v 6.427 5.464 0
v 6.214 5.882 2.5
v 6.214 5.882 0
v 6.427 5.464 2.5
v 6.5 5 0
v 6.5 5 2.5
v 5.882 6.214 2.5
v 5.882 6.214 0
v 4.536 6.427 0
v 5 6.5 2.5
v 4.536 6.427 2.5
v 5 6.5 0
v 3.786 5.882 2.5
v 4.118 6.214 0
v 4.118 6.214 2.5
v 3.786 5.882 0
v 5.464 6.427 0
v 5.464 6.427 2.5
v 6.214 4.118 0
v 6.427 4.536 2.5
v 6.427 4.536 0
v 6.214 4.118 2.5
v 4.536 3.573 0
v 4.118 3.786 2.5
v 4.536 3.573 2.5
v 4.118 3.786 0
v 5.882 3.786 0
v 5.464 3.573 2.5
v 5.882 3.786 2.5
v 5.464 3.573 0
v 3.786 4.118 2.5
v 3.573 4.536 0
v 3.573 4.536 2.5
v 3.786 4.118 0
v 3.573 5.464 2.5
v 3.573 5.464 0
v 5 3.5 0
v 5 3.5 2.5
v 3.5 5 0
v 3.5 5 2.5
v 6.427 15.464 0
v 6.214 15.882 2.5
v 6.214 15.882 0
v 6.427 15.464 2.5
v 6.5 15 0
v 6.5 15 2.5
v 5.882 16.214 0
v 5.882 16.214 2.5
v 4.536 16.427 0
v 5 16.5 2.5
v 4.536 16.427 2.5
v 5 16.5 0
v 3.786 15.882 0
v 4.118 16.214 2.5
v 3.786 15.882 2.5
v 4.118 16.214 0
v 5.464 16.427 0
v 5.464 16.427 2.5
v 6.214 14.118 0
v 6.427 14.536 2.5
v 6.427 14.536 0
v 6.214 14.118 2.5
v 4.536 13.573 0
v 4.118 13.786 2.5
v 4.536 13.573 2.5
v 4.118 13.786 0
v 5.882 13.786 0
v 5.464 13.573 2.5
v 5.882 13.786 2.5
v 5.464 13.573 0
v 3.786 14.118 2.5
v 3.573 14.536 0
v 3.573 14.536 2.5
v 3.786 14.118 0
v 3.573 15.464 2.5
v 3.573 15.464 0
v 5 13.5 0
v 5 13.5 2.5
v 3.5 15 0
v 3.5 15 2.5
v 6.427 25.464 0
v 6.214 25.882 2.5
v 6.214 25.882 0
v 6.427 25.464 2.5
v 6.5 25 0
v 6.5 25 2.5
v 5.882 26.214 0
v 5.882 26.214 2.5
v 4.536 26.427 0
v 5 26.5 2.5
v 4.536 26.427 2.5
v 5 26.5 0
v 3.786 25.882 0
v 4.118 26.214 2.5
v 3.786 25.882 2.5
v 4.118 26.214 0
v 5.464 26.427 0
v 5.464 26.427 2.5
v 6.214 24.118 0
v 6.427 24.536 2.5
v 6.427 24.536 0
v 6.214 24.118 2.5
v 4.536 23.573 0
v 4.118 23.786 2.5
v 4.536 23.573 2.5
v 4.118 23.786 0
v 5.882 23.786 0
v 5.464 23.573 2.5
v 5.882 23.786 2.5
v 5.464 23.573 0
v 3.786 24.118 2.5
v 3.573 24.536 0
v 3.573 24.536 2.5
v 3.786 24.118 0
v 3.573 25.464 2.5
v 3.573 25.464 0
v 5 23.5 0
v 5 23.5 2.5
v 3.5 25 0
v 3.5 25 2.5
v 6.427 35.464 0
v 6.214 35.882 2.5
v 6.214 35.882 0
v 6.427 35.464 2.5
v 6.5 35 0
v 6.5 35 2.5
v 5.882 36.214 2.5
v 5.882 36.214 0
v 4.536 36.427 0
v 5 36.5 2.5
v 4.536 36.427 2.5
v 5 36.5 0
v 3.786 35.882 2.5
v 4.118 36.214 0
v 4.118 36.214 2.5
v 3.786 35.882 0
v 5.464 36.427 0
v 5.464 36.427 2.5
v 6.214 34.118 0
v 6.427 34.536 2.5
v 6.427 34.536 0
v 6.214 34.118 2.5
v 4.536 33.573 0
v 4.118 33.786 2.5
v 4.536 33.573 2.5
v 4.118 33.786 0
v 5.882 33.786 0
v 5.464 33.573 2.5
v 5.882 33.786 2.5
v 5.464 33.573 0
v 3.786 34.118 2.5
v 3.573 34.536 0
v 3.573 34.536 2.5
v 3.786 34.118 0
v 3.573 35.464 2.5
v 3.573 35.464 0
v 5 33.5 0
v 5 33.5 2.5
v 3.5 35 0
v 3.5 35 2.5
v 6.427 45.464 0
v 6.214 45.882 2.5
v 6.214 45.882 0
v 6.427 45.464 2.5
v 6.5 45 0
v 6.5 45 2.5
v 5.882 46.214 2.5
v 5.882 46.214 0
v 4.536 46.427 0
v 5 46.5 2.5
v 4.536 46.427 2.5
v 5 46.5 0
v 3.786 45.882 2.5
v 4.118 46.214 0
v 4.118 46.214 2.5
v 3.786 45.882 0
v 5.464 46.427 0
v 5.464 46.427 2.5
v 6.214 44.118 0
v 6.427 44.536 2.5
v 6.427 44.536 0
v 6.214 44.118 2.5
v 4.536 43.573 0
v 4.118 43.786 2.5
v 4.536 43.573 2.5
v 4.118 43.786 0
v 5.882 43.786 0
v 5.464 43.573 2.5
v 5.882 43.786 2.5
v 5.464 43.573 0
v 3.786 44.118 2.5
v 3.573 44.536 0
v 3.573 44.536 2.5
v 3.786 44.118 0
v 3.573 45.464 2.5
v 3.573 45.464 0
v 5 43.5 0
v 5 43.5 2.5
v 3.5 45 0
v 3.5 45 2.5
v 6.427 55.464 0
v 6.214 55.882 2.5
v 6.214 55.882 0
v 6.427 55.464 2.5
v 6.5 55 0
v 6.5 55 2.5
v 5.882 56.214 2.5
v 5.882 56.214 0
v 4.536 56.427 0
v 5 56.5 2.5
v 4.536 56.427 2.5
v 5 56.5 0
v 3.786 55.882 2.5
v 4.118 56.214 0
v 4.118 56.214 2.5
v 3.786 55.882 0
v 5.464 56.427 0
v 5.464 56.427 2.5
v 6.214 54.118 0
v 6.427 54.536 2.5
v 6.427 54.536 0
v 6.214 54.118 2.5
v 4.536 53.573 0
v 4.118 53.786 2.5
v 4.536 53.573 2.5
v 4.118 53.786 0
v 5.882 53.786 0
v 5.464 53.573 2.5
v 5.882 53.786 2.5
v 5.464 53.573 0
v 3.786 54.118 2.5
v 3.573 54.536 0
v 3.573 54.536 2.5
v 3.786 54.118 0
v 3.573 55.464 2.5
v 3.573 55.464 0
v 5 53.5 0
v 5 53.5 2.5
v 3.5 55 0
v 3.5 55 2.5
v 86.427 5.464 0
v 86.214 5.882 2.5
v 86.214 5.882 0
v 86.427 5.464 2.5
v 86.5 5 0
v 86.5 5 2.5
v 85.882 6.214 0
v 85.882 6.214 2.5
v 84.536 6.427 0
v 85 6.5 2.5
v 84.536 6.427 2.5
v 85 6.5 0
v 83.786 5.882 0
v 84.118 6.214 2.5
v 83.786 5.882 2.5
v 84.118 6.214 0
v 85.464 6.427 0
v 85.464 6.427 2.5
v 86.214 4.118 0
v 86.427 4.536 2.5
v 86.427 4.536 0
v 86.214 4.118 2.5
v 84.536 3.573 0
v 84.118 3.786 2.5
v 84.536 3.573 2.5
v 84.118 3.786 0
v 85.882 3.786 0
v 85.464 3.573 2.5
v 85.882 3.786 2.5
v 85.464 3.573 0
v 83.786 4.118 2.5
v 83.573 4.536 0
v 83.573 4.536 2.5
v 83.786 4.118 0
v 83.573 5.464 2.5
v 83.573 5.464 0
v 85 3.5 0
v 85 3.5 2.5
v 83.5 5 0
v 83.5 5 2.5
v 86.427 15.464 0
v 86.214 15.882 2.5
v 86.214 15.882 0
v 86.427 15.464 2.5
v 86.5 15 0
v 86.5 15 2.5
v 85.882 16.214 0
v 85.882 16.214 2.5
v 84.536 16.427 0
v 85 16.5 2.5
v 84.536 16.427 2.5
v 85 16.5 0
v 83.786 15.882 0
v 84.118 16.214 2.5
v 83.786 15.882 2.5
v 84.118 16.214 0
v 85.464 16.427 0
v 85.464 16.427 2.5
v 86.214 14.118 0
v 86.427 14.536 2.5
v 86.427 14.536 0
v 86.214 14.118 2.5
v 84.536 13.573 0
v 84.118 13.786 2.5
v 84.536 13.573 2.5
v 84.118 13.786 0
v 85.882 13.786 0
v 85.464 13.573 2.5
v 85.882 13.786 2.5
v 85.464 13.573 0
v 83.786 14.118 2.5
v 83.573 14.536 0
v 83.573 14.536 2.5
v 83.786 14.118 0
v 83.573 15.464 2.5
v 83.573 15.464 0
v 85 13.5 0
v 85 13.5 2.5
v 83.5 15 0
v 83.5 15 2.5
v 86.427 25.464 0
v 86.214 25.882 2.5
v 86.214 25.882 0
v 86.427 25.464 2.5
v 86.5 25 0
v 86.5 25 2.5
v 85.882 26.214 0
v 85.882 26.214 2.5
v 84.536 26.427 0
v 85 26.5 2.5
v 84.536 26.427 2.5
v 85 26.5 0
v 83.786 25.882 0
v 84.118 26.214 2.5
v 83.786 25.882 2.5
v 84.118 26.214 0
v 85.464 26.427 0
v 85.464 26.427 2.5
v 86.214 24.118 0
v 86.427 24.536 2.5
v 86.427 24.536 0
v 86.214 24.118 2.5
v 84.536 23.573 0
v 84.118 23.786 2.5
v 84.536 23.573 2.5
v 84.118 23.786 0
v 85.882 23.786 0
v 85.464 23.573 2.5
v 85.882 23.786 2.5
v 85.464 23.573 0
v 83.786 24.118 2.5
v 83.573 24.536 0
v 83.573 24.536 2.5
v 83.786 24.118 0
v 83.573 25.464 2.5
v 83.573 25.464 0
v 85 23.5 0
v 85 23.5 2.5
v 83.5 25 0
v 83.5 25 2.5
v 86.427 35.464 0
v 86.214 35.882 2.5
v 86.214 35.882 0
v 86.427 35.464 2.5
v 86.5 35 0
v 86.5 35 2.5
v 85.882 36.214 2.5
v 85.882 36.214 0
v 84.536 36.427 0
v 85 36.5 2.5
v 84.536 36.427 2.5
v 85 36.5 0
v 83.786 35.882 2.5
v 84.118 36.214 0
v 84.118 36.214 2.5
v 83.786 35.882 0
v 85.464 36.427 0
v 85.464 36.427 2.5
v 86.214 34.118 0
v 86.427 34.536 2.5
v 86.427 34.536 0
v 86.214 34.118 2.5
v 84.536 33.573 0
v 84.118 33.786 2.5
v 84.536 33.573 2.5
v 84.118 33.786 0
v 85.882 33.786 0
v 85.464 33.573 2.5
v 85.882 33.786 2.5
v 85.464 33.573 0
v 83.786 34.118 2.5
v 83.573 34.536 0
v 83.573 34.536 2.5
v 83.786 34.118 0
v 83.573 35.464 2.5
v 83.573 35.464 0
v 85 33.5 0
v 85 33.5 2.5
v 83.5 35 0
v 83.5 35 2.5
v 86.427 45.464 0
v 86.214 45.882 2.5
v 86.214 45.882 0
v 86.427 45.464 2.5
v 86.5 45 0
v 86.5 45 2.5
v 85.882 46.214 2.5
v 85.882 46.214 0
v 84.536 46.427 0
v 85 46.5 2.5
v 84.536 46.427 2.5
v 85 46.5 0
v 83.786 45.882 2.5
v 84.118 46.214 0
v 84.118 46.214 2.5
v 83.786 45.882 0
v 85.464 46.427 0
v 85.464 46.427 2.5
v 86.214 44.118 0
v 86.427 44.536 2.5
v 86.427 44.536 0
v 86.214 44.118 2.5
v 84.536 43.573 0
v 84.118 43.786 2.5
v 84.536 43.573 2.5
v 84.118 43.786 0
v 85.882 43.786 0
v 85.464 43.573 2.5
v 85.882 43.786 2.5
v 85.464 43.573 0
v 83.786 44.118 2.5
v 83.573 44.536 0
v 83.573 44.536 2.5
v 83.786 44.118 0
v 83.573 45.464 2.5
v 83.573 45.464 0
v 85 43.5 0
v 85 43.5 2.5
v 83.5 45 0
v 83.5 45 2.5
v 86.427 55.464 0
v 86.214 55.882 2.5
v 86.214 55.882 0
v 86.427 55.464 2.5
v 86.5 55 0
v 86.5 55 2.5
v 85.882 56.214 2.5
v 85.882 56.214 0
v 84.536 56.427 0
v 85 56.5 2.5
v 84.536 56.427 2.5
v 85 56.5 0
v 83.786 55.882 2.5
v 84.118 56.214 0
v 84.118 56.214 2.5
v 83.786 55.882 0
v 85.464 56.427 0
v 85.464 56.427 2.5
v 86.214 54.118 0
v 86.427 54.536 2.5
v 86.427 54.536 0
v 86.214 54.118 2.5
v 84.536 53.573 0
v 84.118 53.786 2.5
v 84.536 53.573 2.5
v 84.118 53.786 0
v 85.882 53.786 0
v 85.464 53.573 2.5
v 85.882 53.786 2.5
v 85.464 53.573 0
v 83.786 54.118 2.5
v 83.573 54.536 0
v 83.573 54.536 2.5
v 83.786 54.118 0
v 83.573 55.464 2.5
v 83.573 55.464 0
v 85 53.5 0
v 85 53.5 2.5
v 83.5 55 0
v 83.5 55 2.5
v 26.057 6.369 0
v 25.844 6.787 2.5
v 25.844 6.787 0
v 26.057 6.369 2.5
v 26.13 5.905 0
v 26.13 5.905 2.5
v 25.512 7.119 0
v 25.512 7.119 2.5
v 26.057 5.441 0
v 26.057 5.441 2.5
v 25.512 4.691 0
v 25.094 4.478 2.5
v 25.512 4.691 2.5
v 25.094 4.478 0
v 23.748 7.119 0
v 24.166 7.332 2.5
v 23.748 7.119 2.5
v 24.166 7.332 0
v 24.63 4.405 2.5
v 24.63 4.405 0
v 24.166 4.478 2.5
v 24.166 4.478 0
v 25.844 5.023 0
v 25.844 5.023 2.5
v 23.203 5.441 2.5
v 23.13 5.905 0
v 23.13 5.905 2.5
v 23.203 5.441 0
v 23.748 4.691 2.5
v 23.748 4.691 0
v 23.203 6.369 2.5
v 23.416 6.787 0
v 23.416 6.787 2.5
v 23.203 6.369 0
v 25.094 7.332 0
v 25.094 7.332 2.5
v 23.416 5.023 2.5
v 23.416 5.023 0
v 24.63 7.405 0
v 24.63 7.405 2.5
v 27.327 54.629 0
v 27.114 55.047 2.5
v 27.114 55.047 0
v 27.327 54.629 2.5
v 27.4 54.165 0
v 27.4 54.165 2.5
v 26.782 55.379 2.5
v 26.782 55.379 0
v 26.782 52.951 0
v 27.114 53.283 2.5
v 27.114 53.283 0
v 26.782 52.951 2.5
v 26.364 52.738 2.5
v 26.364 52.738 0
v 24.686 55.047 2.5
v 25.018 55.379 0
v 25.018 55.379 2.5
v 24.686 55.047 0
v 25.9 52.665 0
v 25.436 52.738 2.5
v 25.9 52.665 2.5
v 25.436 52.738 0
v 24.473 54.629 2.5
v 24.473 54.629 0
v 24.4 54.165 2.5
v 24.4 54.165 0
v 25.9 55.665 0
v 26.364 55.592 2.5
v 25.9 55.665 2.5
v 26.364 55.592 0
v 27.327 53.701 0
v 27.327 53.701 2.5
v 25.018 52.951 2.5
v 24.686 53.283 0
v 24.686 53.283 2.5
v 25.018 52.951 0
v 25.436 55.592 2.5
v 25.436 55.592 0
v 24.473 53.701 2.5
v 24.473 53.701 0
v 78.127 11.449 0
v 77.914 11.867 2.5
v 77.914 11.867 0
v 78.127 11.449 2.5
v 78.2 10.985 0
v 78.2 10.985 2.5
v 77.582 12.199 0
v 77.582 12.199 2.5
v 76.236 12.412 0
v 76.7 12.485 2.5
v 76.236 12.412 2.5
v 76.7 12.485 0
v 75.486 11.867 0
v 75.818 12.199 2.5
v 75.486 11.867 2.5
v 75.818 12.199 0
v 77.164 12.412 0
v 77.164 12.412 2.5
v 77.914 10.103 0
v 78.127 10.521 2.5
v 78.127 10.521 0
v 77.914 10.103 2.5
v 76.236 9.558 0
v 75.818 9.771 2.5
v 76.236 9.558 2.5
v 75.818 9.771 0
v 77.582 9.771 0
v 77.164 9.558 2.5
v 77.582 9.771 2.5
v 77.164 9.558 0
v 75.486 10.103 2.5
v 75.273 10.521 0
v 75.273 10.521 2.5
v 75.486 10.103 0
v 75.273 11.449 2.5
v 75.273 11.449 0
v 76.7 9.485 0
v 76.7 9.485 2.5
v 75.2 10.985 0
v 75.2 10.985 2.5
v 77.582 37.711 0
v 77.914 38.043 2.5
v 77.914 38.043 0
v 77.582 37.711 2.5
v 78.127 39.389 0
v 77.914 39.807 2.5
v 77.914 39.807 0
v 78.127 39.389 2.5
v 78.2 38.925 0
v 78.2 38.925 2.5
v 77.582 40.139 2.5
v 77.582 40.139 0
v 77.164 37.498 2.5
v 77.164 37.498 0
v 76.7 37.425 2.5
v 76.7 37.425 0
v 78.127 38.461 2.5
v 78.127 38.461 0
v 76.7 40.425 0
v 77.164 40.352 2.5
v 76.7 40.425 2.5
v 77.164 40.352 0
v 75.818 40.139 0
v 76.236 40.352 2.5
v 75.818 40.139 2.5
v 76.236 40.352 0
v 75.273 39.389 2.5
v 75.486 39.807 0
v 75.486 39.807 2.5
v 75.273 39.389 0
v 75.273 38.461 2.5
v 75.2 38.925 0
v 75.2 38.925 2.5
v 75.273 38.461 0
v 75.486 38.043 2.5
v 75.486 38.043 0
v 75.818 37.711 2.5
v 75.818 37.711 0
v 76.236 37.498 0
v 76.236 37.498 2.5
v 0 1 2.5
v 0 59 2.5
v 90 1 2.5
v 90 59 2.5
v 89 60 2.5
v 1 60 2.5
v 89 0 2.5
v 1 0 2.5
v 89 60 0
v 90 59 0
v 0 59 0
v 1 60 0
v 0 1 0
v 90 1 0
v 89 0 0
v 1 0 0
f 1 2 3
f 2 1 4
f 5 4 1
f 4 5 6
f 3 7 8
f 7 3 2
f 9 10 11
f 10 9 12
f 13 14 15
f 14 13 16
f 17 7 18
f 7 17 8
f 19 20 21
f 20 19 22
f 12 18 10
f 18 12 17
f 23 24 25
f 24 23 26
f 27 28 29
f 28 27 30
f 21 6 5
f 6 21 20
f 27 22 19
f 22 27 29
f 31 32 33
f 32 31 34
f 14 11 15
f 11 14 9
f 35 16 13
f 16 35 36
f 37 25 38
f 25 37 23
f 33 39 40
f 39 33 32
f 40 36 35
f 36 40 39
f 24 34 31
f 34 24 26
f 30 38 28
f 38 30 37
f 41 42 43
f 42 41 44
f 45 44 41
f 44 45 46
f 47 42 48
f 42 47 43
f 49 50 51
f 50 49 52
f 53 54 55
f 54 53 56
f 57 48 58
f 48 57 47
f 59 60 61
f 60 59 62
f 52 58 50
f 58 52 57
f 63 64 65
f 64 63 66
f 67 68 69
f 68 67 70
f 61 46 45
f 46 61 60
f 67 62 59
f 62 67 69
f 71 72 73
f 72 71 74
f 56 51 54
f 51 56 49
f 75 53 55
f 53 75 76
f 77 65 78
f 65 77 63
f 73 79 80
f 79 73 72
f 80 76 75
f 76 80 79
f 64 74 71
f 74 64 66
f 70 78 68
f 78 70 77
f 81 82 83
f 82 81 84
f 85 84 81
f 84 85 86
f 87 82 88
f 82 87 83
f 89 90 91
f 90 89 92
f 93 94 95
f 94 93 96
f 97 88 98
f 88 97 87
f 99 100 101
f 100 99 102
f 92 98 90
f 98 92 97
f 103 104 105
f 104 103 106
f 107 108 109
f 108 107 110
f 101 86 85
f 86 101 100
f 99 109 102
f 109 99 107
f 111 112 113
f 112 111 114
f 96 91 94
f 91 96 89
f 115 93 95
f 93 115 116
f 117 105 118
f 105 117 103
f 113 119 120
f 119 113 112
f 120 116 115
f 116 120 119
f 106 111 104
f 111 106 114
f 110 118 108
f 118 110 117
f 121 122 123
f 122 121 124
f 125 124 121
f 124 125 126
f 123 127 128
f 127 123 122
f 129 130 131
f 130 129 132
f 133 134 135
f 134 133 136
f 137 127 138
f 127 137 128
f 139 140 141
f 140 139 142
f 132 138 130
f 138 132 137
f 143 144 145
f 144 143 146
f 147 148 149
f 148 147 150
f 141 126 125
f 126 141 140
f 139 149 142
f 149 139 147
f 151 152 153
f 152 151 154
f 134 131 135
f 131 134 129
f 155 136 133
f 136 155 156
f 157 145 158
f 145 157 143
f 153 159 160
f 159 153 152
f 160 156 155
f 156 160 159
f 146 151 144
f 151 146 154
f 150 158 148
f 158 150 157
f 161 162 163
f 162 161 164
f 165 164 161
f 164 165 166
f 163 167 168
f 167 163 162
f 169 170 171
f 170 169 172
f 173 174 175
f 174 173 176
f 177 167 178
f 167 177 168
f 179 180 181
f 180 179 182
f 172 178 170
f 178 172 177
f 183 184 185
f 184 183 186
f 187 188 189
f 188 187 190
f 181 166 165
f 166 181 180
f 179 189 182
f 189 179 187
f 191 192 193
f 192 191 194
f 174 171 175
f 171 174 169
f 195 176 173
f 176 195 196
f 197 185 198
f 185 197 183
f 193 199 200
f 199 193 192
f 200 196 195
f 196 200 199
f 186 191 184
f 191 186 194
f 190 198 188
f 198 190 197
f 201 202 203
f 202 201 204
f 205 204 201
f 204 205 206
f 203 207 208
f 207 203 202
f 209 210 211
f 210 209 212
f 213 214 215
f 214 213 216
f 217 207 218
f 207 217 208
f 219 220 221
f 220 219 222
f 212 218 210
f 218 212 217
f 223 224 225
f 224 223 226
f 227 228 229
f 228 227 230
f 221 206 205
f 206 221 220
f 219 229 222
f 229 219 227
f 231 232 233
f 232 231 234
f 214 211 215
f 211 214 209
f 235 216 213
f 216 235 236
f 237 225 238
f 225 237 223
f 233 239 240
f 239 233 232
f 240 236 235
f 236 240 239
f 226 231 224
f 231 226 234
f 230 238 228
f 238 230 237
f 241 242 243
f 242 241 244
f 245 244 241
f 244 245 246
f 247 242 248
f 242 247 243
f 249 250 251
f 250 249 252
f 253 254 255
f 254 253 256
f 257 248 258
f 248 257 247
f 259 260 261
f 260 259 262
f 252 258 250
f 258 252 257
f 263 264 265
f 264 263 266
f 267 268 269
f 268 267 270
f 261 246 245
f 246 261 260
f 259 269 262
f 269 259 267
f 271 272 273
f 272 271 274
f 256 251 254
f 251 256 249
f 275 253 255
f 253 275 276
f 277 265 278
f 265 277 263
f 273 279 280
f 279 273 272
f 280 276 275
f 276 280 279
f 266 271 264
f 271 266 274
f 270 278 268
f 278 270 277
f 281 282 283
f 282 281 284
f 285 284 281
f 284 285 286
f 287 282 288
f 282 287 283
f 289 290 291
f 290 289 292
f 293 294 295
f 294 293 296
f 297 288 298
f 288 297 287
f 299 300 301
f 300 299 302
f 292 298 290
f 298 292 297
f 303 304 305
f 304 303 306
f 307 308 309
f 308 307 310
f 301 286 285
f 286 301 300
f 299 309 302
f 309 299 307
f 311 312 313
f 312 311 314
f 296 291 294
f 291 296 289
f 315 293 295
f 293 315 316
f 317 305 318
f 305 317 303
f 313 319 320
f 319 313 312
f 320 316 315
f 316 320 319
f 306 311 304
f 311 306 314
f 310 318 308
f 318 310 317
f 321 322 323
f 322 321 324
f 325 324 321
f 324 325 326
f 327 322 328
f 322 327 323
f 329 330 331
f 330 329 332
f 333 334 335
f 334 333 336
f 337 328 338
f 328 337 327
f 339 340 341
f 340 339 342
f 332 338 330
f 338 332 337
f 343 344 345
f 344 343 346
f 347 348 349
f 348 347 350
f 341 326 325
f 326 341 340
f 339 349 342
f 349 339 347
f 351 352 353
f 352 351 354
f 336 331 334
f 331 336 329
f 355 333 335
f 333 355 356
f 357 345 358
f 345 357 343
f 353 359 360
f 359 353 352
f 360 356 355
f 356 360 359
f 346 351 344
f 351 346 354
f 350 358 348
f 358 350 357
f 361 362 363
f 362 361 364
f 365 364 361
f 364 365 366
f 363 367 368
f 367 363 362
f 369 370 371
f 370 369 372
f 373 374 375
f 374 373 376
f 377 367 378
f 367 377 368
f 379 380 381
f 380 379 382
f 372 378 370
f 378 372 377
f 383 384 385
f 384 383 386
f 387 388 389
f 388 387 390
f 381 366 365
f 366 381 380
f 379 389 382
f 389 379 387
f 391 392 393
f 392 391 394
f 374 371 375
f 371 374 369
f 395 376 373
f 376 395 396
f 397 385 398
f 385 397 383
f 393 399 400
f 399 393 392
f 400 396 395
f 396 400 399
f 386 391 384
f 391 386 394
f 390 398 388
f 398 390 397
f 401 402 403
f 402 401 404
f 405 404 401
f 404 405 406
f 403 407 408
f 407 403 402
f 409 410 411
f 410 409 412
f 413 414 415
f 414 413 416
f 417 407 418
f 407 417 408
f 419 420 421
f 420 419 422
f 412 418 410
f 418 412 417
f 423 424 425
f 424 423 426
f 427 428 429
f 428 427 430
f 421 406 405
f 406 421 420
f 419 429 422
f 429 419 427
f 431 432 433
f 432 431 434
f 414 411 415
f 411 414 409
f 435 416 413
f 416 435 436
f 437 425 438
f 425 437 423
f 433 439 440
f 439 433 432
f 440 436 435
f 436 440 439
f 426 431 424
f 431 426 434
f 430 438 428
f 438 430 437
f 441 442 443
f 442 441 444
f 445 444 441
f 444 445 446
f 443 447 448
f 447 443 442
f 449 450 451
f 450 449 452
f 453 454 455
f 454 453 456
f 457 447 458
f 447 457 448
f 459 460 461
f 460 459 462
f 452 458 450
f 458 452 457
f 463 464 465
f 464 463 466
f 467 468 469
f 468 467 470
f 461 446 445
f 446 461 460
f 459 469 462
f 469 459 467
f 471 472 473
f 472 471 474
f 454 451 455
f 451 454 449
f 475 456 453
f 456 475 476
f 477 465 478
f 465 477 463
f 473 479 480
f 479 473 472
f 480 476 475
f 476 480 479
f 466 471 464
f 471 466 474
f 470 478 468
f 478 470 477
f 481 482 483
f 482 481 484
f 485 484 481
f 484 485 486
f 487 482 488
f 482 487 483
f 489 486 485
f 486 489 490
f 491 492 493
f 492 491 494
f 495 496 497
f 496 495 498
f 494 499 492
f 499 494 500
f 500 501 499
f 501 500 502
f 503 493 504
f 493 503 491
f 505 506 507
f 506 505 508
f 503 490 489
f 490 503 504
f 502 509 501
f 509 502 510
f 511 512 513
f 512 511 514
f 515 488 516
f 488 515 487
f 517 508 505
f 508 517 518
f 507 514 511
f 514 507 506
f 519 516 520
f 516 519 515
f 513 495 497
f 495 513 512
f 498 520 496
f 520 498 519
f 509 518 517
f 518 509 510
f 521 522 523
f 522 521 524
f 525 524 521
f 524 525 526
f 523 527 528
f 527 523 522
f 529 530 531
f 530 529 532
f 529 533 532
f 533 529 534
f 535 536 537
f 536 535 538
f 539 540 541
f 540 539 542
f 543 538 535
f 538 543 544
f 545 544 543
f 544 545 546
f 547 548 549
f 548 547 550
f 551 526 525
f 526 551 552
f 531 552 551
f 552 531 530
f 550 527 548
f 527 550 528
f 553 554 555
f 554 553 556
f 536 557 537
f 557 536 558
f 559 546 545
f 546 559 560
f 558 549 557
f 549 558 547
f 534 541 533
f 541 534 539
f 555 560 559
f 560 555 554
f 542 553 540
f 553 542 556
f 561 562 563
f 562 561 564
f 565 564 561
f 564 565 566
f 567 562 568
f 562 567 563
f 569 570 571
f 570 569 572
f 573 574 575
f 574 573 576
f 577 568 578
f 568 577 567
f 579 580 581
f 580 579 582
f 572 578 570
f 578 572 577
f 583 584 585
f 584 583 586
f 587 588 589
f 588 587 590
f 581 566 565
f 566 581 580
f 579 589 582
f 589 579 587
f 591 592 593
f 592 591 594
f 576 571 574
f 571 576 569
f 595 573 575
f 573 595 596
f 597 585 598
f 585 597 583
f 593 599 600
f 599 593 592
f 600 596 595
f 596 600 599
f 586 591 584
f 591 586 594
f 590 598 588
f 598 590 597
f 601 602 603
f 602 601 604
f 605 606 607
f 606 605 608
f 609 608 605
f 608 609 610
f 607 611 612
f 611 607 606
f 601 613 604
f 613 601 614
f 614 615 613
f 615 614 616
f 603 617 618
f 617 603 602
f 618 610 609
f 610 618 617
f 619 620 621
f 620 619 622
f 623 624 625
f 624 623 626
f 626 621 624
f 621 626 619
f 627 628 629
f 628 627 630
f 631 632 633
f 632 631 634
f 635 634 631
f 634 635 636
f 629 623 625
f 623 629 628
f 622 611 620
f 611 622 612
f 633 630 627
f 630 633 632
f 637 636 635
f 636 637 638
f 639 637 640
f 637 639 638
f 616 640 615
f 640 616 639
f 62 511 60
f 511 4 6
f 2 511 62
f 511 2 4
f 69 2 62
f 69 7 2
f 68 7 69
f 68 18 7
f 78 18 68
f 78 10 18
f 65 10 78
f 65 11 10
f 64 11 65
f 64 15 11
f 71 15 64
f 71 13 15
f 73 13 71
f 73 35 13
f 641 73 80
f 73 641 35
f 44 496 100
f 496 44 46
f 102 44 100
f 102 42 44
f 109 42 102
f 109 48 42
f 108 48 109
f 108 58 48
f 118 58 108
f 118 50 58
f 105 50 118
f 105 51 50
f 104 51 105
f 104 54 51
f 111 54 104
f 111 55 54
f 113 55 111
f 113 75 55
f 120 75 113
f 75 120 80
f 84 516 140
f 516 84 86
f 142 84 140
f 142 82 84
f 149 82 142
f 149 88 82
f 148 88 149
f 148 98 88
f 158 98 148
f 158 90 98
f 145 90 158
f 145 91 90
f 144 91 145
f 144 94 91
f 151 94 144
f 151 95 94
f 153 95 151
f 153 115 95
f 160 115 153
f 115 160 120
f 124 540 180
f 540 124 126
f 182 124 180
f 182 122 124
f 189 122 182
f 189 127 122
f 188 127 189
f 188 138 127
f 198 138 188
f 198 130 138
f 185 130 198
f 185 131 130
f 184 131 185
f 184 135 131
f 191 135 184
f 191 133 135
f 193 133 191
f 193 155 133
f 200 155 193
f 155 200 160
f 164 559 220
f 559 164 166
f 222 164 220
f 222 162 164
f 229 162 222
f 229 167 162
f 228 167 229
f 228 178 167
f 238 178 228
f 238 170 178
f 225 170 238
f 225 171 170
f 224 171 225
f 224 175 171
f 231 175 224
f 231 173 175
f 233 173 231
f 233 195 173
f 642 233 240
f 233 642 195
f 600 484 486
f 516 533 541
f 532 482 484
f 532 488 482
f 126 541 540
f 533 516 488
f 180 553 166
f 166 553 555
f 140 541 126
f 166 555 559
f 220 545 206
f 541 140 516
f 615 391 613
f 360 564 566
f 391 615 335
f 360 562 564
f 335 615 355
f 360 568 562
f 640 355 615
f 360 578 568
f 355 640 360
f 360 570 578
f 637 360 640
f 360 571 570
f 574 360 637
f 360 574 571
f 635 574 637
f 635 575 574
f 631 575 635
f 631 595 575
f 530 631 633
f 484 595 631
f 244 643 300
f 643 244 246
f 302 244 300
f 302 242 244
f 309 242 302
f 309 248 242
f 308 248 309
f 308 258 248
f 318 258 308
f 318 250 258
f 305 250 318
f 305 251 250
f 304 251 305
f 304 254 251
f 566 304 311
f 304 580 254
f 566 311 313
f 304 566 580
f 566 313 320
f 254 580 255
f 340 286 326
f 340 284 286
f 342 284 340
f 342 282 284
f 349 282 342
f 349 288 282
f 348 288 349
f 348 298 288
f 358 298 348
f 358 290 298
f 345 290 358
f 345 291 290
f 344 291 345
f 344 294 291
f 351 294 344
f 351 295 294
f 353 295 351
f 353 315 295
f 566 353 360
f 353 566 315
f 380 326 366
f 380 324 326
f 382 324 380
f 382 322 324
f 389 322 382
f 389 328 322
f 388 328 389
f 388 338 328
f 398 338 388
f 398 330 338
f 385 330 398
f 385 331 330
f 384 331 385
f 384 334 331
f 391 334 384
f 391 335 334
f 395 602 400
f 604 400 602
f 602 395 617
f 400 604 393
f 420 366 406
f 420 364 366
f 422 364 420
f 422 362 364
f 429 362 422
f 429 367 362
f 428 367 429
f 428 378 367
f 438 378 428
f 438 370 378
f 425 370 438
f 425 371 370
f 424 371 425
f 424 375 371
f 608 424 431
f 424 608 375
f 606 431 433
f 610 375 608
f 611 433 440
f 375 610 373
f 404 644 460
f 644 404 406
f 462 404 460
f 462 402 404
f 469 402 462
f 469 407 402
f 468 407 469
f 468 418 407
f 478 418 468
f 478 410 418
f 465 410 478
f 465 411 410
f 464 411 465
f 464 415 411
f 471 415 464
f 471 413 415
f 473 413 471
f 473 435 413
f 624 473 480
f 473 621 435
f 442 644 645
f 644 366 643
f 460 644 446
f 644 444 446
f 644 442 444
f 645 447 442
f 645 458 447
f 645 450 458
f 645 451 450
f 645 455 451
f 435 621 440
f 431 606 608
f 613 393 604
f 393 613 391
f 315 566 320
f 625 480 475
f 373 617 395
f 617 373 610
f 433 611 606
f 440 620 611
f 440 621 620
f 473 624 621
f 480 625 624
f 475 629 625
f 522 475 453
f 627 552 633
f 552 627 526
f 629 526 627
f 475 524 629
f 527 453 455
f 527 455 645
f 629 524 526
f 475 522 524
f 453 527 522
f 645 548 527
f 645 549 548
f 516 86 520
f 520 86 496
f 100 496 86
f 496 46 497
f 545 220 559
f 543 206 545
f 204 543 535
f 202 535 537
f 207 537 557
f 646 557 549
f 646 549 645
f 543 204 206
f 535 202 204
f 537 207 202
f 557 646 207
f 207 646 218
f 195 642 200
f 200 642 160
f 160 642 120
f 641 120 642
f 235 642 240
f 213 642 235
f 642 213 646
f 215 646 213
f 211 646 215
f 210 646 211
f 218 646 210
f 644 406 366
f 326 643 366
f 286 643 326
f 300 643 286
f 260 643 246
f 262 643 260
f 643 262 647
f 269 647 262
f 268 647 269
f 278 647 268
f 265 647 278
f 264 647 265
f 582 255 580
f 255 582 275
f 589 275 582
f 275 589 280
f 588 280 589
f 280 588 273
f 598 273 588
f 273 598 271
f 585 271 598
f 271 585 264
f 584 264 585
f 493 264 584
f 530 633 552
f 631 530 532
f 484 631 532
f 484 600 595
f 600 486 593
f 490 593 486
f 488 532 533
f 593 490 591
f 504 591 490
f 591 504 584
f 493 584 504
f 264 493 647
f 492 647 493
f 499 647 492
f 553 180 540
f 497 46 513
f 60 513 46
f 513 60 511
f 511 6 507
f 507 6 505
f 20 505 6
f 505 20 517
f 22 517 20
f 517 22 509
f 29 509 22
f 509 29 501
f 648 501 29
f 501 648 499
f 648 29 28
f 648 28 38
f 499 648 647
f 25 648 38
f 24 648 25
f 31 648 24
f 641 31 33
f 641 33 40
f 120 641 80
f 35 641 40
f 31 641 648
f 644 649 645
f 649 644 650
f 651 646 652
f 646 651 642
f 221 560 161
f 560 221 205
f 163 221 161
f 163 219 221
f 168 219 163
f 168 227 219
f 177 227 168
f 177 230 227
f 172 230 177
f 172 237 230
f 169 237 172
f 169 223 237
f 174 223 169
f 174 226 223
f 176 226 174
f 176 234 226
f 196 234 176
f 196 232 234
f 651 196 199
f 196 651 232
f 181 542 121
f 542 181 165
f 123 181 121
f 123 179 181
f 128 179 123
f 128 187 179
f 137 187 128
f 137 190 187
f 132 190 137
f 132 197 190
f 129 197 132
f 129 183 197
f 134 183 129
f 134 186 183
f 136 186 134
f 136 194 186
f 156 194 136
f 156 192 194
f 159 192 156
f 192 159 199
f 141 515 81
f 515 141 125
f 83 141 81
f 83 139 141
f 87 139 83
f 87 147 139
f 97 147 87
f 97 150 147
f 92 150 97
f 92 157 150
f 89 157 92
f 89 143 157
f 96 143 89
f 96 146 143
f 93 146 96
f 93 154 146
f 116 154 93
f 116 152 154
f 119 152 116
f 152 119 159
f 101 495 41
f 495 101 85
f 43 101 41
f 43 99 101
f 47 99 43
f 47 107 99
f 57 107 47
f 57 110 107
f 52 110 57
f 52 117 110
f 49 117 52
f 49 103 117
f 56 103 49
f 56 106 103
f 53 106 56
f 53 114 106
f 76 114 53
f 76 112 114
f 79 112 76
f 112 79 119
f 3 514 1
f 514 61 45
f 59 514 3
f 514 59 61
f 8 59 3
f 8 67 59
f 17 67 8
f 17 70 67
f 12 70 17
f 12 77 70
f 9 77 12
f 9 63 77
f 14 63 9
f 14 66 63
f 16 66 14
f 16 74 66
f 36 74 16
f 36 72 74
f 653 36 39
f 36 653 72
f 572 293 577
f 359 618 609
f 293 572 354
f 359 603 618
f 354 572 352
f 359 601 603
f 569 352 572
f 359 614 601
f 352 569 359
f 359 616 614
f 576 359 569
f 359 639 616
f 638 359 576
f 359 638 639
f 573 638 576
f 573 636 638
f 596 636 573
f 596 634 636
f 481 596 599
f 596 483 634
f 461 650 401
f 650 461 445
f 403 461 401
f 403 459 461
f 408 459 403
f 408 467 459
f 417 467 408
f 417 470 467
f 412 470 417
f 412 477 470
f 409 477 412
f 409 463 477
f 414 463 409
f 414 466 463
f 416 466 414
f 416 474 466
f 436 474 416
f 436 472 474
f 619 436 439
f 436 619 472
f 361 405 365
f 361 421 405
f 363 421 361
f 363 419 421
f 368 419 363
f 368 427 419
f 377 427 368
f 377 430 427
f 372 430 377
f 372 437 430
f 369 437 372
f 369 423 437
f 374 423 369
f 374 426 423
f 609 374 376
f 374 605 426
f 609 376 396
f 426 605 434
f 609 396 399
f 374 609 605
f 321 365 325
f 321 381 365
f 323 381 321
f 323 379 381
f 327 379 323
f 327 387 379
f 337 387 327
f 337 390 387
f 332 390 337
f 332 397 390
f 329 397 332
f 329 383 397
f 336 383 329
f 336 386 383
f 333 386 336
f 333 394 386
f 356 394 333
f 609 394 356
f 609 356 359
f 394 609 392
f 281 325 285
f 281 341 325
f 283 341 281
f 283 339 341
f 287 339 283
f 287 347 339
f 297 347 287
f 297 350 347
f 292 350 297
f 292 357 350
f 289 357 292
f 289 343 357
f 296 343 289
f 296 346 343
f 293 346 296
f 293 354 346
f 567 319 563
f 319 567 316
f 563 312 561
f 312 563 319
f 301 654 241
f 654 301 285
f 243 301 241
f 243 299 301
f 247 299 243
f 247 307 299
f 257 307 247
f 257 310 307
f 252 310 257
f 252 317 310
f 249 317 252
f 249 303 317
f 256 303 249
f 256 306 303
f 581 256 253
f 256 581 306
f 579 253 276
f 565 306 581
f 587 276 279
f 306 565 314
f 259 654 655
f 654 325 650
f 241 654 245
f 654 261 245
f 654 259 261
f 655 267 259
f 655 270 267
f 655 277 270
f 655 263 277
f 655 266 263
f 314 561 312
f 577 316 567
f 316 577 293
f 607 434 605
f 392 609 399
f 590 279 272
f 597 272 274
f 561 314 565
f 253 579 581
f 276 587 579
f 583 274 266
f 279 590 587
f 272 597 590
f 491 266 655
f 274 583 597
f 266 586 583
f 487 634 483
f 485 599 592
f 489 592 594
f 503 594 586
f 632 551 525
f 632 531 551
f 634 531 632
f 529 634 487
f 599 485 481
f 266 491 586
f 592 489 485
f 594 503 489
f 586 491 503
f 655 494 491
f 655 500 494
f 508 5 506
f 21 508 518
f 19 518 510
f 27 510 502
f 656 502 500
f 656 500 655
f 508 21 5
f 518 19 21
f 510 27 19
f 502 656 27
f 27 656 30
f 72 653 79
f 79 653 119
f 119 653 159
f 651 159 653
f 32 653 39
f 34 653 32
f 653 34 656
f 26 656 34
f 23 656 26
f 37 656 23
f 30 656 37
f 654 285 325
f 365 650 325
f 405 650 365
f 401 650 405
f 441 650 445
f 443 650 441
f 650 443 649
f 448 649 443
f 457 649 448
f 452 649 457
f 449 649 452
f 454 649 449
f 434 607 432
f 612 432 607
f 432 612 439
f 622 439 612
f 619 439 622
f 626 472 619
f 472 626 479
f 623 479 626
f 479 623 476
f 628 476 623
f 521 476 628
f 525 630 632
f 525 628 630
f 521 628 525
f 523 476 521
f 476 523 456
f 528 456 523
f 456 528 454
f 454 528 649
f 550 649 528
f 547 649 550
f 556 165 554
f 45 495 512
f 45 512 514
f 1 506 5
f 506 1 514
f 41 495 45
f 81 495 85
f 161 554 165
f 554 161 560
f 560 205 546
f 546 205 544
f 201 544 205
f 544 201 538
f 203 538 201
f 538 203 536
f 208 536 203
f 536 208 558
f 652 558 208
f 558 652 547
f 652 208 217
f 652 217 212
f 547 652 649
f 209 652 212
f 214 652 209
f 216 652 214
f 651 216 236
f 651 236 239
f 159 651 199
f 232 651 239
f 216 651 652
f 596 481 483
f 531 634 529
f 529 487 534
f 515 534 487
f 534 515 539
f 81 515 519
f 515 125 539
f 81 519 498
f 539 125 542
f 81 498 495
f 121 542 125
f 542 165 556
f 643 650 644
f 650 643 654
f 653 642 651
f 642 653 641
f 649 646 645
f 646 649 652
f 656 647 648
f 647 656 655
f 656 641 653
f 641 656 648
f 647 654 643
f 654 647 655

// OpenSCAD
$fn=20;
N = 9;
M = 6;
HOLE_DIAMETER = 3.0;

width = 10*N;
length = 10*M;

CHAMFER = 1;
tall = 2.5;


A= CHAMFER*-1;
B= CHAMFER*2;
difference(){
    cube([width,length, 2.5]);
    for(i = [0:1]){
        for(j = [0:M-1]){
            translate([5+(10*i*(N-1)),5+(10*j),0]){
                cylinder(h = 10, d = HOLE_DIAMETER, center = true);
            }
        }
    }
    translate([(90-68.68)/2,(60-53.27)/2,0]){
        translate([13.97,2.54,0])cylinder(d=3.0,h=100,center=true);
        translate([15.24,50.8,0])cylinder(d=3.0,h=100,center=true);
        translate([66.04,7.62,0])cylinder(d=3.0,h=100,center=true);
        translate([66.04,35.56,0])cylinder(d=3.0,h=100,center=true);
    }
    linear_extrude(height = tall*2, center = true){
        polygon(points=[[A,A],[A,B],[B,A]]);
    }
    
    
    translate([width,0,tall]){
        rotate(180,[0,-1,0]){
            linear_extrude(height = tall*2,center = true){
                polygon(points=[[A,A],[A,B],[B,A]]);
            }
        }
    }
    
    translate([width,length,0]){
        rotate(180,[0,0,1]){
            linear_extrude(height = tall*2,center = true){
                polygon(points=[[A,A],[A,B],[B,A]]);
            }
            
            translate([width,0,tall]){
                rotate(180,[0,-1,0]){
                    linear_extrude(height = tall*2, center = true){
                        polygon(points=[[A,A],[A,B],[B,A]]);
                    }
                }
            }
        }
    }

}
